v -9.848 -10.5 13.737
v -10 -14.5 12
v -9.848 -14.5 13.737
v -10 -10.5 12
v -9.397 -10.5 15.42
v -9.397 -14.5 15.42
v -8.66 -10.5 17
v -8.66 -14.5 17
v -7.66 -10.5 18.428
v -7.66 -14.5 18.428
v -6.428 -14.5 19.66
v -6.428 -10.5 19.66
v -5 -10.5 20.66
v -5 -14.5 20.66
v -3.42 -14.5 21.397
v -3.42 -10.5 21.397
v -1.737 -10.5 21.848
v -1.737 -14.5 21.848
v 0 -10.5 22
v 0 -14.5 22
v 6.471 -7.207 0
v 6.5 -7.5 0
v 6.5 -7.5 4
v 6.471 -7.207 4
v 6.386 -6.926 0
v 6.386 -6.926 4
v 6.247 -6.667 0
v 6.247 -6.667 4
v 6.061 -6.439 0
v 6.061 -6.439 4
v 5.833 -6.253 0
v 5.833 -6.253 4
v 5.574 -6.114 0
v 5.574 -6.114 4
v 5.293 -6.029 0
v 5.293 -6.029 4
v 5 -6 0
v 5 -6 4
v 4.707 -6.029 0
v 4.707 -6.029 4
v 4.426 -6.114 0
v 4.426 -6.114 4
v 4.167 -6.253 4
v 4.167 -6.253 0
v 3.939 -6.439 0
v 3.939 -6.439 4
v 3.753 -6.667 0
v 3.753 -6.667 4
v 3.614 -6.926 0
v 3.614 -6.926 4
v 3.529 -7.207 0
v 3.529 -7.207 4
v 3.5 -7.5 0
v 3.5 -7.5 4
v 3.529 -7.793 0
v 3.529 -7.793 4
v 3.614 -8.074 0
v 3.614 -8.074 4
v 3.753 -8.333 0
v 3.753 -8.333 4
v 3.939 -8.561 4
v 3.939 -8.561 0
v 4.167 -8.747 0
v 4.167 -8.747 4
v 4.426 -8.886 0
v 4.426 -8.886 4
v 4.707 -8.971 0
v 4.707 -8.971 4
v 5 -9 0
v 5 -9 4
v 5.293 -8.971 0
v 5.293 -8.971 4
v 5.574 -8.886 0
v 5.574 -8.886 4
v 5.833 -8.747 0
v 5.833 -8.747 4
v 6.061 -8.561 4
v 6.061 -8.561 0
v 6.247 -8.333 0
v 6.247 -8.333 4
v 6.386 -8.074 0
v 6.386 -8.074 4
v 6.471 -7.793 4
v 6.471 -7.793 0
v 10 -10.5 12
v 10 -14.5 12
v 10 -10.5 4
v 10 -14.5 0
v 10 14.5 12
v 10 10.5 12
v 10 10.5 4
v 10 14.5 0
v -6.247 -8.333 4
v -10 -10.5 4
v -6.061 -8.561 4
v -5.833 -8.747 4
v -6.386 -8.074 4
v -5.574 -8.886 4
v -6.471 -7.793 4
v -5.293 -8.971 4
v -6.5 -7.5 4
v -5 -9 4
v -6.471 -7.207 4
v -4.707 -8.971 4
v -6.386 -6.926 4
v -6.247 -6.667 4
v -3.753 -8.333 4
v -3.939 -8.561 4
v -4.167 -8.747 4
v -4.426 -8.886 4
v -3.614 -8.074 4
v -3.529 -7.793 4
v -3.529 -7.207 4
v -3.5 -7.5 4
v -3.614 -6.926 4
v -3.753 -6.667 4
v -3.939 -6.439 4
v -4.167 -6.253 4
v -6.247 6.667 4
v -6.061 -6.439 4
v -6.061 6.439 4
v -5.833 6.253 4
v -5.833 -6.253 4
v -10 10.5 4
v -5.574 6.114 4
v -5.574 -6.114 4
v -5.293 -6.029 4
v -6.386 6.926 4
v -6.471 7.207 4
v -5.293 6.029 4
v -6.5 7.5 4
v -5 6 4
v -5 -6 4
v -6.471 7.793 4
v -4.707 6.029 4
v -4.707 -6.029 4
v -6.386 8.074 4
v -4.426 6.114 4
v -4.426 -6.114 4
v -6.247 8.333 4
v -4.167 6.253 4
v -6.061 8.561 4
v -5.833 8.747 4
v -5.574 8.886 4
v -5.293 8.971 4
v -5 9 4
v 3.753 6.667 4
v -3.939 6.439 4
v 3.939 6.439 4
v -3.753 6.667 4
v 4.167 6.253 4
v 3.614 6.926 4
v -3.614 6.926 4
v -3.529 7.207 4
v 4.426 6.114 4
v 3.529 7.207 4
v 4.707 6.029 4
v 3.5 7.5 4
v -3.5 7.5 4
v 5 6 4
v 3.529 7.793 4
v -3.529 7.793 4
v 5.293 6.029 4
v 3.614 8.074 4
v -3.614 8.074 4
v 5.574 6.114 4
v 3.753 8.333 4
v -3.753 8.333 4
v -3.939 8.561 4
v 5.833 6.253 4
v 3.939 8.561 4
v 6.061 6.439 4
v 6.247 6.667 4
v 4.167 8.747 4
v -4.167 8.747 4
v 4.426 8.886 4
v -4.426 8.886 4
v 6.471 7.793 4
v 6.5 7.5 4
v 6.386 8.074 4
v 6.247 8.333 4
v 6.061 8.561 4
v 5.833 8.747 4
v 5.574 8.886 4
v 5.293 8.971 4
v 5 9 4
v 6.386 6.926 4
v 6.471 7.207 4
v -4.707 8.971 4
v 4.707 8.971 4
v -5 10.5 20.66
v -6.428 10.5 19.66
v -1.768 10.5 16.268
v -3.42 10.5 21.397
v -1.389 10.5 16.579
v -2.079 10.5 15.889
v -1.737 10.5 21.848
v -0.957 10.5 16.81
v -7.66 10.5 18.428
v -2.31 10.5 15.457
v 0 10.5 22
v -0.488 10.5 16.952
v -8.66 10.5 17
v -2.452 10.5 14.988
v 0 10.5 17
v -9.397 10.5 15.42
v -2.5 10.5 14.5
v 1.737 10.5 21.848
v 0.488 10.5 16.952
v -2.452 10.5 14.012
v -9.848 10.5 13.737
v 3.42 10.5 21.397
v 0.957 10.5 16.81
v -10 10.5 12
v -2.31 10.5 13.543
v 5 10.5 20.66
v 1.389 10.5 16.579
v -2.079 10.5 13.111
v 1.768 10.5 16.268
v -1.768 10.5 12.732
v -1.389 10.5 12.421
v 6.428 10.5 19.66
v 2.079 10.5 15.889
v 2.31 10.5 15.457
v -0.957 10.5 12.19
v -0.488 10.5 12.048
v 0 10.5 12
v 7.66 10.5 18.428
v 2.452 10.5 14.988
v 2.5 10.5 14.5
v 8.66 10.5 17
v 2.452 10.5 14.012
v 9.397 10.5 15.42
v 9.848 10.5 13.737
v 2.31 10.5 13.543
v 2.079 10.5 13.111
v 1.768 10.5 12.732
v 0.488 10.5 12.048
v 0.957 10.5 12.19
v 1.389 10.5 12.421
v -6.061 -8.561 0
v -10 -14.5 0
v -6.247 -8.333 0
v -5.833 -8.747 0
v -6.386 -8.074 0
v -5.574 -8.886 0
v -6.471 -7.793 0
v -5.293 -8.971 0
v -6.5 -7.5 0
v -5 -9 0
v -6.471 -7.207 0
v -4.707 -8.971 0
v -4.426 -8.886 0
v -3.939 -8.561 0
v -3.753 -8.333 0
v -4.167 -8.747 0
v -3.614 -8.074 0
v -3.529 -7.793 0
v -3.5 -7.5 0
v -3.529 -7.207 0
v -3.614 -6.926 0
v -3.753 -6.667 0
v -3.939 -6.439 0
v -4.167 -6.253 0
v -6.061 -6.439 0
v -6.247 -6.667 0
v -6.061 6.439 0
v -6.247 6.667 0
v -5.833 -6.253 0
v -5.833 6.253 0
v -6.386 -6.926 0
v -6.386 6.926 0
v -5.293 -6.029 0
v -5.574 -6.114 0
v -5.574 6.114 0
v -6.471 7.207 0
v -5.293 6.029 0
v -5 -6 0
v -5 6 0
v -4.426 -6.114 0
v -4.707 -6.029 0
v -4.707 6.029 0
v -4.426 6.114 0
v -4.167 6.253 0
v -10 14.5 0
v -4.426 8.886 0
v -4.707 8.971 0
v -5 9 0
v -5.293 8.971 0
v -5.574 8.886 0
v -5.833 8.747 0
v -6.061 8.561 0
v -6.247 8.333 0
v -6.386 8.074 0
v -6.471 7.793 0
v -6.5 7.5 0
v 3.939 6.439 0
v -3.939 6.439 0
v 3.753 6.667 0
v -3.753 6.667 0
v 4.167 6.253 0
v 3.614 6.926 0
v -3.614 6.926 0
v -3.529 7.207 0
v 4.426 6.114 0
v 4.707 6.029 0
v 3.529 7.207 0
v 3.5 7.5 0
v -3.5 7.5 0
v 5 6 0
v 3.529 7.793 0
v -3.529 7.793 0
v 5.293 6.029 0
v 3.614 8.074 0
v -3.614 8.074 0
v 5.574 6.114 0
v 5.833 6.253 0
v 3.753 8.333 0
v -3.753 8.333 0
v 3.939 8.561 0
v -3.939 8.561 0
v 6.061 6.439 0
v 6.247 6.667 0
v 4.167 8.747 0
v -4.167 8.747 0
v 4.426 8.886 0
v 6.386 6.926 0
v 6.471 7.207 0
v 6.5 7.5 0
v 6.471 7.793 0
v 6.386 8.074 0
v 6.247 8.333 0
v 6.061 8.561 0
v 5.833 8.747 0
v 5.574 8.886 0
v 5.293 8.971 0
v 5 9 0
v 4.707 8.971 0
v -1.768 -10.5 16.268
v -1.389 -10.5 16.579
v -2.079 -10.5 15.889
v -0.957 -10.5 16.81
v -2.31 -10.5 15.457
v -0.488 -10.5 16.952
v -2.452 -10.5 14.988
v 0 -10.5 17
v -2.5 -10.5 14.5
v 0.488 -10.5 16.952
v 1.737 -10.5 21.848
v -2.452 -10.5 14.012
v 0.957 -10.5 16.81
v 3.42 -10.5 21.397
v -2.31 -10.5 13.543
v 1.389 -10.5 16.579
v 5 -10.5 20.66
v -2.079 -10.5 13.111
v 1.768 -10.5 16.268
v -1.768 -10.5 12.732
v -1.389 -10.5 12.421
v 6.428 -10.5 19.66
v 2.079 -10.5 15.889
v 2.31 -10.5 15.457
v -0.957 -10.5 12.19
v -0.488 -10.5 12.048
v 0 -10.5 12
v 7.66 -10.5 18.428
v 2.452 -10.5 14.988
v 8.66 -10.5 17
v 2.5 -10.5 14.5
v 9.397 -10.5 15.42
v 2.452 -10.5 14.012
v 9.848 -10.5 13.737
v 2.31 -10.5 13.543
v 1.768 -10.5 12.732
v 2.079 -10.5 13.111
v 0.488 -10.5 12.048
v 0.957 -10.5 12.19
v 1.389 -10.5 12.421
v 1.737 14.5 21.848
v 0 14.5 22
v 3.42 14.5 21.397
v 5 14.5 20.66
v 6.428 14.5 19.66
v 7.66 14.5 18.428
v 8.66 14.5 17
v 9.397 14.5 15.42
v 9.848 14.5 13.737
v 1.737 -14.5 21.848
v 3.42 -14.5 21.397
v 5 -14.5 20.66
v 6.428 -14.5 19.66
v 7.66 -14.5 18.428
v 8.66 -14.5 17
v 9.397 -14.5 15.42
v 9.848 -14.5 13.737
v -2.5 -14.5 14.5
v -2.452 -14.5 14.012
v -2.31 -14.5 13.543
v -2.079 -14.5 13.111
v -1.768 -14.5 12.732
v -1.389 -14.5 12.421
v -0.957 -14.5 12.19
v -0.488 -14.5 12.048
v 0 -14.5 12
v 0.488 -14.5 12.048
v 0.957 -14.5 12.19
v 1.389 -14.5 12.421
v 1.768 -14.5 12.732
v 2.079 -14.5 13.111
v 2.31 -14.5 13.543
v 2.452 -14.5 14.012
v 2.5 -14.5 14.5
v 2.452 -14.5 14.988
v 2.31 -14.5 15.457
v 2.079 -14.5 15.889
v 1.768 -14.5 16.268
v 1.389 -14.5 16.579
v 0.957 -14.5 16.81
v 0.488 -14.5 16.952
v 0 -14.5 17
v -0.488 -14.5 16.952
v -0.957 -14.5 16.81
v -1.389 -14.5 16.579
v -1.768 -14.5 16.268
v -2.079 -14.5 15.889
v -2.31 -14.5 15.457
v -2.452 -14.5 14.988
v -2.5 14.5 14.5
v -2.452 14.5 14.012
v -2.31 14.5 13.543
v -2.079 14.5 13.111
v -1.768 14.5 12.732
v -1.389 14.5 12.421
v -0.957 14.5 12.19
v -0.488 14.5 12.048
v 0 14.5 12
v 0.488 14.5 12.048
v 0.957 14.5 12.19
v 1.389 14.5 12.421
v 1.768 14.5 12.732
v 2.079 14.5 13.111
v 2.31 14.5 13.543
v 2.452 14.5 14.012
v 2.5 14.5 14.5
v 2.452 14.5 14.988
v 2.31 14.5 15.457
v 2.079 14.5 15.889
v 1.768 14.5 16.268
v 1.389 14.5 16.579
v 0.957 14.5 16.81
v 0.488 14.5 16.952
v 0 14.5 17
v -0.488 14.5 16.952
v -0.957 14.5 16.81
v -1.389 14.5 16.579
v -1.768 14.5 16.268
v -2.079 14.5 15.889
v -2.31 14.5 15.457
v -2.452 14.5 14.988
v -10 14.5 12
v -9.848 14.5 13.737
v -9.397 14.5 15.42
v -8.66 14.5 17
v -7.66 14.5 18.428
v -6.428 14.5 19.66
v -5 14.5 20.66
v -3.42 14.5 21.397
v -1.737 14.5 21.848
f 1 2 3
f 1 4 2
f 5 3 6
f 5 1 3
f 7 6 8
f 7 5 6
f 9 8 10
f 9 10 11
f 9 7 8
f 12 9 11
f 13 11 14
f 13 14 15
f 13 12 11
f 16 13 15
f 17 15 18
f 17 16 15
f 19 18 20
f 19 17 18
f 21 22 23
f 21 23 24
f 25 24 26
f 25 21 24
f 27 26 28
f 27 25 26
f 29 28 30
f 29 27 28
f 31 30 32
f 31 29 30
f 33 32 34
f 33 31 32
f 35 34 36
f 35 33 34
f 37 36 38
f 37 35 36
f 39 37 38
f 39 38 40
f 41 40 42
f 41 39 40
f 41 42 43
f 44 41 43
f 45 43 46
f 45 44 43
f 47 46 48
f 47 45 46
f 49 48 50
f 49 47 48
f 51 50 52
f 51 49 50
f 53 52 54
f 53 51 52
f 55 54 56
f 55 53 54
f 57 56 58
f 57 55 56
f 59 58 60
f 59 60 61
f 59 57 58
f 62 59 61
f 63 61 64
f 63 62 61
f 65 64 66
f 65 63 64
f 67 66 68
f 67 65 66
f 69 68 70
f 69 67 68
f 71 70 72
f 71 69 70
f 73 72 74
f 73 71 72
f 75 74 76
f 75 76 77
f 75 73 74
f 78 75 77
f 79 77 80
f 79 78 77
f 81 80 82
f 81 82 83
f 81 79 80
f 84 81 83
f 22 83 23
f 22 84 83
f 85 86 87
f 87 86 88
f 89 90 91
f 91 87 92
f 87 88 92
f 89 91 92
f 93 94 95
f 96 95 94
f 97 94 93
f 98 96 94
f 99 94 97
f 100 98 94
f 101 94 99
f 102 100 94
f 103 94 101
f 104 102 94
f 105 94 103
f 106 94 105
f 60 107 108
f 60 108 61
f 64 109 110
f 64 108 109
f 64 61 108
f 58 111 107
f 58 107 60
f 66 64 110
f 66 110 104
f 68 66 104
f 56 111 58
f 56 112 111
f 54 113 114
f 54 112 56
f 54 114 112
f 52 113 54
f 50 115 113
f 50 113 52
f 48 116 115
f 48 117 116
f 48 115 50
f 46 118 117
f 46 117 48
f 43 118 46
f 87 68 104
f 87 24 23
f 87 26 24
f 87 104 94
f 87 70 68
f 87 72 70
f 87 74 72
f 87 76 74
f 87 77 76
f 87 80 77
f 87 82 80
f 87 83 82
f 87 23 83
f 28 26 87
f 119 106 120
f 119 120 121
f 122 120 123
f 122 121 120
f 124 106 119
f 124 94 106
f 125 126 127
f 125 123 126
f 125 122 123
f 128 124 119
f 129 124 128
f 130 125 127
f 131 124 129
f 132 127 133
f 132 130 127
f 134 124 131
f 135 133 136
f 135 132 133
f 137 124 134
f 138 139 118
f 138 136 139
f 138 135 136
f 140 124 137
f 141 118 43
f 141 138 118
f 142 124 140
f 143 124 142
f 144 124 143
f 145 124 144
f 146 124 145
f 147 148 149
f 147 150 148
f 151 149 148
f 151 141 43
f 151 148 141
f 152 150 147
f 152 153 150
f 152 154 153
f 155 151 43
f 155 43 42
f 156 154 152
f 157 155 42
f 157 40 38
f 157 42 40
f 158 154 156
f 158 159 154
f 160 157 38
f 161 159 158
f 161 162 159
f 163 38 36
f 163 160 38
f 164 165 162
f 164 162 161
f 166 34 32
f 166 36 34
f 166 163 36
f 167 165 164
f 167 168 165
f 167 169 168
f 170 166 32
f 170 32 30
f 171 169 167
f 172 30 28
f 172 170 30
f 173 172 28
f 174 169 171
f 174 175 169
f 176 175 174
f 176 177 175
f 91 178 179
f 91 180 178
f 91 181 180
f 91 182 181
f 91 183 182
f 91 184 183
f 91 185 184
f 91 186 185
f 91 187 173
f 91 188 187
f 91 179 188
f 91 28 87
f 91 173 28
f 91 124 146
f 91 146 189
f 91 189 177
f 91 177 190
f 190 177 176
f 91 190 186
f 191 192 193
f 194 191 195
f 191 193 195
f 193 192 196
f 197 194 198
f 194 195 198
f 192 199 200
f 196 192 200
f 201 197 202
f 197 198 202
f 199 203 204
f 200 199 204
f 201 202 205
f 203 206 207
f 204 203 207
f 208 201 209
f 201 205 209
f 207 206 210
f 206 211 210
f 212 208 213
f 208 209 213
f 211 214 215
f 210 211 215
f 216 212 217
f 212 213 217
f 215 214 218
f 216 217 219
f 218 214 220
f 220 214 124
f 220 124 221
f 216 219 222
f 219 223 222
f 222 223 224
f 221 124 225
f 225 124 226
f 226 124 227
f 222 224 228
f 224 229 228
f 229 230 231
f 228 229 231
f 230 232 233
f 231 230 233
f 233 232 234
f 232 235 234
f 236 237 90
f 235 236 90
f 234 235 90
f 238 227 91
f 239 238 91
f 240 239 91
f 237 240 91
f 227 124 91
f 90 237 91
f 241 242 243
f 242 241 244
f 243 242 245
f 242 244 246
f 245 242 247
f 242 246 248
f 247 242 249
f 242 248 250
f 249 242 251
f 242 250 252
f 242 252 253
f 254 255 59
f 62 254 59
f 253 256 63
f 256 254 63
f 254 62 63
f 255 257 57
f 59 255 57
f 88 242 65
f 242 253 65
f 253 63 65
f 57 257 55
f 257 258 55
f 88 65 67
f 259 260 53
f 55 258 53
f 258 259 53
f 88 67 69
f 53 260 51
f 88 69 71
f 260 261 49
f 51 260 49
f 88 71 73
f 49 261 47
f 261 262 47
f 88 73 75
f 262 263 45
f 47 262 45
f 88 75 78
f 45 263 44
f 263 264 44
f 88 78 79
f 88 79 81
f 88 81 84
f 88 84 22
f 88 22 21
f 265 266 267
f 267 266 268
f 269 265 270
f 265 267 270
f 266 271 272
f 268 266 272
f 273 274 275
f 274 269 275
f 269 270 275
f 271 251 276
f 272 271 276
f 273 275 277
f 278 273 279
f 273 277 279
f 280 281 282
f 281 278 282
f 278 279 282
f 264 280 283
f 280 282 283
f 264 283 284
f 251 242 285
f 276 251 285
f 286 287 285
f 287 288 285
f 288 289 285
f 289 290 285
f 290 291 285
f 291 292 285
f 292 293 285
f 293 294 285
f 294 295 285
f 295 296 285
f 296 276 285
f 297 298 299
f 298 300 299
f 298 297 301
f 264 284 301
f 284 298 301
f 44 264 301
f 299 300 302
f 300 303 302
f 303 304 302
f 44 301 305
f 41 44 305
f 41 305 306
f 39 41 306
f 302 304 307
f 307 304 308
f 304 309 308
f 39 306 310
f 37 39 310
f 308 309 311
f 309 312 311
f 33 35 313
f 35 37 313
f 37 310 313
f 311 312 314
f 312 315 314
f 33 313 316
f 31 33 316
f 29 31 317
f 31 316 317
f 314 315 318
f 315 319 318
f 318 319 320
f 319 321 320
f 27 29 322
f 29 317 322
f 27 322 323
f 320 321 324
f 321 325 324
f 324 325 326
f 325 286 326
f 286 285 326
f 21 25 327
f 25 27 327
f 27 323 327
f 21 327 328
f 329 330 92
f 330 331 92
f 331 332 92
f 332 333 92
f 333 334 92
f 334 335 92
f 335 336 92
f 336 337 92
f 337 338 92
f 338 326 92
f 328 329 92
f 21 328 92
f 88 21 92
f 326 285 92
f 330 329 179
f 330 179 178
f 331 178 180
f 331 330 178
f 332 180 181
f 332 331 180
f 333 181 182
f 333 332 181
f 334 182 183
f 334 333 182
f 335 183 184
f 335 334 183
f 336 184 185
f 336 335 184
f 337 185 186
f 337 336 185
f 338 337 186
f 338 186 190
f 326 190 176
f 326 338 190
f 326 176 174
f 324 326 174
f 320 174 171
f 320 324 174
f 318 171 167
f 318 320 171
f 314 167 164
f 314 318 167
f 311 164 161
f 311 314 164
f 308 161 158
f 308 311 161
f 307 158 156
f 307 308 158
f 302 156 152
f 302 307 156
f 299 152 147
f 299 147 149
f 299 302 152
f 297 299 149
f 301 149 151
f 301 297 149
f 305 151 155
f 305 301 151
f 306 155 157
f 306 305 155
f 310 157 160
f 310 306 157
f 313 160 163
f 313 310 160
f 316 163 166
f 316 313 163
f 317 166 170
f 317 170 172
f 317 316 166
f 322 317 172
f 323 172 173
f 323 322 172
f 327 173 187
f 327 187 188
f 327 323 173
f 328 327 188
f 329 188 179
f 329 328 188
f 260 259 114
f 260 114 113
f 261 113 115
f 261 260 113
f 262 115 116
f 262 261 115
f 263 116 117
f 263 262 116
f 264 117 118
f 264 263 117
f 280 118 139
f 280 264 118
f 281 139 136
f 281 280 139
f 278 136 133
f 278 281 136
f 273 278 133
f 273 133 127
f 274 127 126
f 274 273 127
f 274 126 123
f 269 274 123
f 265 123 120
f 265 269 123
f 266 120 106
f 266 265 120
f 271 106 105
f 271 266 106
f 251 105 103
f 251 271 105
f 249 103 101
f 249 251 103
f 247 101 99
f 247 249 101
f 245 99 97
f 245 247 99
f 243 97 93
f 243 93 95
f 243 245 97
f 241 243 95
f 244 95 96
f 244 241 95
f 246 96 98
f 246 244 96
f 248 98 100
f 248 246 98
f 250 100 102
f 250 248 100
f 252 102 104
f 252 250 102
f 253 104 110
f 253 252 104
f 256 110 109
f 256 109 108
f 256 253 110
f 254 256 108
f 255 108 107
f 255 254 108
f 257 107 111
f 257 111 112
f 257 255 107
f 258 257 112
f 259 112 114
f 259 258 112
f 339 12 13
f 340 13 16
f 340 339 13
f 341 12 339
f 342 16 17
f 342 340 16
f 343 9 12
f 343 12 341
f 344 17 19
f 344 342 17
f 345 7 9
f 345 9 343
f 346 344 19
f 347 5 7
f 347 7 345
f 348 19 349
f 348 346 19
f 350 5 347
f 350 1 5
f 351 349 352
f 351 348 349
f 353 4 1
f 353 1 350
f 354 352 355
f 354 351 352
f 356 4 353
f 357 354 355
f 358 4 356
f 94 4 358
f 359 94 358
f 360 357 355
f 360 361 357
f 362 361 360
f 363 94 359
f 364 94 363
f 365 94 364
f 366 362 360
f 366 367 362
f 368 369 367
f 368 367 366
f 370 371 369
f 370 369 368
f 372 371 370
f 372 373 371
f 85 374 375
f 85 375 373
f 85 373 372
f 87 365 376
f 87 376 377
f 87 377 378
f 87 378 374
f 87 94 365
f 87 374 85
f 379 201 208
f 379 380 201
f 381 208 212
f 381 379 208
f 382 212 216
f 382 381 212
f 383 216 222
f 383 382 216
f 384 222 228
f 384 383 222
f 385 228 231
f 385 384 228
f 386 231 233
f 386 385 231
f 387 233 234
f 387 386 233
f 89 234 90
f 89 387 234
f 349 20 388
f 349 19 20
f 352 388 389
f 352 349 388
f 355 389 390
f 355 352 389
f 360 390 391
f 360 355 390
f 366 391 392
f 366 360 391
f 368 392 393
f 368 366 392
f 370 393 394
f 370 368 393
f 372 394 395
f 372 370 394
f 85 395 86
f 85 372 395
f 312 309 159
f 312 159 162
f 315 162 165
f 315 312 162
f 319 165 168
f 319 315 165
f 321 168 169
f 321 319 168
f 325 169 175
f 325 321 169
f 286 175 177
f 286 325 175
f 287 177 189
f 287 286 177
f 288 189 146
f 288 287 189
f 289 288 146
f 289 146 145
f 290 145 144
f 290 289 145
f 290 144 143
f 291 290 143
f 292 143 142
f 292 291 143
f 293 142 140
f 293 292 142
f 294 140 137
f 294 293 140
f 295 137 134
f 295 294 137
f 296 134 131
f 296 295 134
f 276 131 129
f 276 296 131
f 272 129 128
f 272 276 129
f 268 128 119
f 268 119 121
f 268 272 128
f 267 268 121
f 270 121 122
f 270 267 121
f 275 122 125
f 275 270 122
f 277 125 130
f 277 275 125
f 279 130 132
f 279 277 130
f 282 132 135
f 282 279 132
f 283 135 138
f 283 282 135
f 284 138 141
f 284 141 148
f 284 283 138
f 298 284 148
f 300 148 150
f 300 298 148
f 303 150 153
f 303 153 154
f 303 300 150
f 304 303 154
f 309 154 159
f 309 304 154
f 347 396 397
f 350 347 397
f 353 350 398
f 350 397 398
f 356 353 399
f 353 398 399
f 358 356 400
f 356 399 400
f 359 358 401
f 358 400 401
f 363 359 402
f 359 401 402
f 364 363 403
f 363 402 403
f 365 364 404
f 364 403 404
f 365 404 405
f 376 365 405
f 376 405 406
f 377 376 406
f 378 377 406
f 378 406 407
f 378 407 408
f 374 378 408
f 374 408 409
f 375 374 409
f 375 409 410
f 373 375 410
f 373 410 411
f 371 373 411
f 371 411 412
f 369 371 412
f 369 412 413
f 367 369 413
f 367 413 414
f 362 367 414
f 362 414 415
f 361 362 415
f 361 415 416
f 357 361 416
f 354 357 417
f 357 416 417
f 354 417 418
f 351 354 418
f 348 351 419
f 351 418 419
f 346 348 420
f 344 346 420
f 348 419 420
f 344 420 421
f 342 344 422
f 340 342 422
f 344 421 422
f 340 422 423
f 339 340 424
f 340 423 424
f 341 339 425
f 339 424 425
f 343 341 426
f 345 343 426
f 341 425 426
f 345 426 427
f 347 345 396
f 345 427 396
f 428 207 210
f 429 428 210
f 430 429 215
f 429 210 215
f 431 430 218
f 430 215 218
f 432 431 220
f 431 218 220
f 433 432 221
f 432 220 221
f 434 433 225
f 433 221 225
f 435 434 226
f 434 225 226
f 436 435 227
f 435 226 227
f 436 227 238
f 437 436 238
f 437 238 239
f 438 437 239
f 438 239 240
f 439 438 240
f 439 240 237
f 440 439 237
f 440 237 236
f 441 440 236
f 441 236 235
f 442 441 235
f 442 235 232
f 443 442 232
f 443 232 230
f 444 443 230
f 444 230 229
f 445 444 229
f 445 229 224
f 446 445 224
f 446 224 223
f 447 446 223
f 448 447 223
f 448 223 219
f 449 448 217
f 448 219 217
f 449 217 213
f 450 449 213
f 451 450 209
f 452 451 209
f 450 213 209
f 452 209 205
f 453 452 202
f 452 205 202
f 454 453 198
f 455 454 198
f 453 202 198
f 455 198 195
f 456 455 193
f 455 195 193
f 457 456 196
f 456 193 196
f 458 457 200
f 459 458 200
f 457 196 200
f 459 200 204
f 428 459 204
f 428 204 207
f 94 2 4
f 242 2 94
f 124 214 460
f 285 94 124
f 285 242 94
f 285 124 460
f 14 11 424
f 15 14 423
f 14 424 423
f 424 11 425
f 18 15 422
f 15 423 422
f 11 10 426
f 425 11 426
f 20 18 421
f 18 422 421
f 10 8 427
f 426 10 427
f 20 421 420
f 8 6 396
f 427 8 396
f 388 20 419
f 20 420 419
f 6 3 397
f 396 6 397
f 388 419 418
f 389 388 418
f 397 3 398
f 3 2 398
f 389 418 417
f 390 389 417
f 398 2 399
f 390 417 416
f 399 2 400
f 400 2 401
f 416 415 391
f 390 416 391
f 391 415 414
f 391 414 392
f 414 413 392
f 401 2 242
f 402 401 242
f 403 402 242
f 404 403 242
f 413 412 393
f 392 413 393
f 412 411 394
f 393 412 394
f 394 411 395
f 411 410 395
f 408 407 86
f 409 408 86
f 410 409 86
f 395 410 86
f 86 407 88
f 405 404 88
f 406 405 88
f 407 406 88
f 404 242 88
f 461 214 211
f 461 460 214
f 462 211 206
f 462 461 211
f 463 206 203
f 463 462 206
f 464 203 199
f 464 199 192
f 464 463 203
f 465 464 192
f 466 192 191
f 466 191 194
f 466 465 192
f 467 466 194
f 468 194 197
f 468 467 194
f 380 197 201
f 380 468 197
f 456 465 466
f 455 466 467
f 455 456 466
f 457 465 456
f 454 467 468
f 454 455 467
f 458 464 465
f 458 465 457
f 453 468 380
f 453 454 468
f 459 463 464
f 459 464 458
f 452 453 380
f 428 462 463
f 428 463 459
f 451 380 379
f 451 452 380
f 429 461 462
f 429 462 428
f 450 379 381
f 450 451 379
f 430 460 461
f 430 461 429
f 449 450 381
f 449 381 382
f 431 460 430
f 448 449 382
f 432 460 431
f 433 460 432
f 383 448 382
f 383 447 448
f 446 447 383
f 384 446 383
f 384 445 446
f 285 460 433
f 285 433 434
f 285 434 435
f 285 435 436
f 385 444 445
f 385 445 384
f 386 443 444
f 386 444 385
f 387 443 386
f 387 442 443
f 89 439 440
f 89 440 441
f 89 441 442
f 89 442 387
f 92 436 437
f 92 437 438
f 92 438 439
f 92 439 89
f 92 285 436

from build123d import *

# Parameters (mm, degrees)
SKETCH_1_W          = 20
SKETCH_1_H          = 29
SKETCH_1_R          = 1.5
EXTRUDE_1_DEPTH     = 4
SKETCH_2_W          = 20
SKETCH_2_H          = 4
EXTRUDE_2_DEPTH     = 18
CUT_EXTRUDE_1_DEPTH = 38.749172176
FILLET_1_R          = 10


with BuildPart() as part:
    # 草图1 → 凸台-拉伸1 (new body)
    with BuildSketch(Plane.XY):
        Rectangle(SKETCH_1_W, SKETCH_1_H)
        with Locations((5, 7.5)):
            Circle(SKETCH_1_R, mode=Mode.SUBTRACT)
        with Locations((-5, 7.5)):
            Circle(SKETCH_1_R, mode=Mode.SUBTRACT)
        with Locations((-5, -7.5)):
            Circle(SKETCH_1_R, mode=Mode.SUBTRACT)
        with Locations((5, -7.5)):
            Circle(SKETCH_1_R, mode=Mode.SUBTRACT)
    extrude(amount=EXTRUDE_1_DEPTH)

    # 草图2 → 凸台-拉伸2 (add)
    with BuildSketch(Plane.XY.offset(4)):
        with Locations((0, 12.5)):
            Rectangle(SKETCH_2_W, SKETCH_2_H)
        with Locations((0, -12.5)):
            Rectangle(SKETCH_2_W, SKETCH_2_H)
    extrude(amount=EXTRUDE_2_DEPTH)

    # 草图3 → 切除-拉伸1 (cut, through all)
    with BuildSketch(Plane.XZ.offset(14.5)):
        with BuildLine():
            ThreePointArc((2.5, 14.5), (0, 17), (-2.5, 14.5))
            Line((-2.5, 14.5), (2.5, 14.5))
        make_face()
        with BuildLine():
            Line((2.5, 14.5), (-2.5, 14.5))
            ThreePointArc((-2.5, 14.5), (0, 12), (2.5, 14.5))
        make_face()
    extrude(amount=-CUT_EXTRUDE_1_DEPTH, mode=Mode.SUBTRACT)

    # 圆角1
    fillet_1_edges = [part.edges().sort_by_distance(p)[0] for p in [
        (10, -12.5, 22),
        (10, 12.5, 22),
        (-10, 12.5, 22),
        (-10, -12.5, 22),
    ]]
    fillet(fillet_1_edges, radius=FILLET_1_R - 0.0001)  # a hair under: the kernel refuses the full size


solid = part.part
